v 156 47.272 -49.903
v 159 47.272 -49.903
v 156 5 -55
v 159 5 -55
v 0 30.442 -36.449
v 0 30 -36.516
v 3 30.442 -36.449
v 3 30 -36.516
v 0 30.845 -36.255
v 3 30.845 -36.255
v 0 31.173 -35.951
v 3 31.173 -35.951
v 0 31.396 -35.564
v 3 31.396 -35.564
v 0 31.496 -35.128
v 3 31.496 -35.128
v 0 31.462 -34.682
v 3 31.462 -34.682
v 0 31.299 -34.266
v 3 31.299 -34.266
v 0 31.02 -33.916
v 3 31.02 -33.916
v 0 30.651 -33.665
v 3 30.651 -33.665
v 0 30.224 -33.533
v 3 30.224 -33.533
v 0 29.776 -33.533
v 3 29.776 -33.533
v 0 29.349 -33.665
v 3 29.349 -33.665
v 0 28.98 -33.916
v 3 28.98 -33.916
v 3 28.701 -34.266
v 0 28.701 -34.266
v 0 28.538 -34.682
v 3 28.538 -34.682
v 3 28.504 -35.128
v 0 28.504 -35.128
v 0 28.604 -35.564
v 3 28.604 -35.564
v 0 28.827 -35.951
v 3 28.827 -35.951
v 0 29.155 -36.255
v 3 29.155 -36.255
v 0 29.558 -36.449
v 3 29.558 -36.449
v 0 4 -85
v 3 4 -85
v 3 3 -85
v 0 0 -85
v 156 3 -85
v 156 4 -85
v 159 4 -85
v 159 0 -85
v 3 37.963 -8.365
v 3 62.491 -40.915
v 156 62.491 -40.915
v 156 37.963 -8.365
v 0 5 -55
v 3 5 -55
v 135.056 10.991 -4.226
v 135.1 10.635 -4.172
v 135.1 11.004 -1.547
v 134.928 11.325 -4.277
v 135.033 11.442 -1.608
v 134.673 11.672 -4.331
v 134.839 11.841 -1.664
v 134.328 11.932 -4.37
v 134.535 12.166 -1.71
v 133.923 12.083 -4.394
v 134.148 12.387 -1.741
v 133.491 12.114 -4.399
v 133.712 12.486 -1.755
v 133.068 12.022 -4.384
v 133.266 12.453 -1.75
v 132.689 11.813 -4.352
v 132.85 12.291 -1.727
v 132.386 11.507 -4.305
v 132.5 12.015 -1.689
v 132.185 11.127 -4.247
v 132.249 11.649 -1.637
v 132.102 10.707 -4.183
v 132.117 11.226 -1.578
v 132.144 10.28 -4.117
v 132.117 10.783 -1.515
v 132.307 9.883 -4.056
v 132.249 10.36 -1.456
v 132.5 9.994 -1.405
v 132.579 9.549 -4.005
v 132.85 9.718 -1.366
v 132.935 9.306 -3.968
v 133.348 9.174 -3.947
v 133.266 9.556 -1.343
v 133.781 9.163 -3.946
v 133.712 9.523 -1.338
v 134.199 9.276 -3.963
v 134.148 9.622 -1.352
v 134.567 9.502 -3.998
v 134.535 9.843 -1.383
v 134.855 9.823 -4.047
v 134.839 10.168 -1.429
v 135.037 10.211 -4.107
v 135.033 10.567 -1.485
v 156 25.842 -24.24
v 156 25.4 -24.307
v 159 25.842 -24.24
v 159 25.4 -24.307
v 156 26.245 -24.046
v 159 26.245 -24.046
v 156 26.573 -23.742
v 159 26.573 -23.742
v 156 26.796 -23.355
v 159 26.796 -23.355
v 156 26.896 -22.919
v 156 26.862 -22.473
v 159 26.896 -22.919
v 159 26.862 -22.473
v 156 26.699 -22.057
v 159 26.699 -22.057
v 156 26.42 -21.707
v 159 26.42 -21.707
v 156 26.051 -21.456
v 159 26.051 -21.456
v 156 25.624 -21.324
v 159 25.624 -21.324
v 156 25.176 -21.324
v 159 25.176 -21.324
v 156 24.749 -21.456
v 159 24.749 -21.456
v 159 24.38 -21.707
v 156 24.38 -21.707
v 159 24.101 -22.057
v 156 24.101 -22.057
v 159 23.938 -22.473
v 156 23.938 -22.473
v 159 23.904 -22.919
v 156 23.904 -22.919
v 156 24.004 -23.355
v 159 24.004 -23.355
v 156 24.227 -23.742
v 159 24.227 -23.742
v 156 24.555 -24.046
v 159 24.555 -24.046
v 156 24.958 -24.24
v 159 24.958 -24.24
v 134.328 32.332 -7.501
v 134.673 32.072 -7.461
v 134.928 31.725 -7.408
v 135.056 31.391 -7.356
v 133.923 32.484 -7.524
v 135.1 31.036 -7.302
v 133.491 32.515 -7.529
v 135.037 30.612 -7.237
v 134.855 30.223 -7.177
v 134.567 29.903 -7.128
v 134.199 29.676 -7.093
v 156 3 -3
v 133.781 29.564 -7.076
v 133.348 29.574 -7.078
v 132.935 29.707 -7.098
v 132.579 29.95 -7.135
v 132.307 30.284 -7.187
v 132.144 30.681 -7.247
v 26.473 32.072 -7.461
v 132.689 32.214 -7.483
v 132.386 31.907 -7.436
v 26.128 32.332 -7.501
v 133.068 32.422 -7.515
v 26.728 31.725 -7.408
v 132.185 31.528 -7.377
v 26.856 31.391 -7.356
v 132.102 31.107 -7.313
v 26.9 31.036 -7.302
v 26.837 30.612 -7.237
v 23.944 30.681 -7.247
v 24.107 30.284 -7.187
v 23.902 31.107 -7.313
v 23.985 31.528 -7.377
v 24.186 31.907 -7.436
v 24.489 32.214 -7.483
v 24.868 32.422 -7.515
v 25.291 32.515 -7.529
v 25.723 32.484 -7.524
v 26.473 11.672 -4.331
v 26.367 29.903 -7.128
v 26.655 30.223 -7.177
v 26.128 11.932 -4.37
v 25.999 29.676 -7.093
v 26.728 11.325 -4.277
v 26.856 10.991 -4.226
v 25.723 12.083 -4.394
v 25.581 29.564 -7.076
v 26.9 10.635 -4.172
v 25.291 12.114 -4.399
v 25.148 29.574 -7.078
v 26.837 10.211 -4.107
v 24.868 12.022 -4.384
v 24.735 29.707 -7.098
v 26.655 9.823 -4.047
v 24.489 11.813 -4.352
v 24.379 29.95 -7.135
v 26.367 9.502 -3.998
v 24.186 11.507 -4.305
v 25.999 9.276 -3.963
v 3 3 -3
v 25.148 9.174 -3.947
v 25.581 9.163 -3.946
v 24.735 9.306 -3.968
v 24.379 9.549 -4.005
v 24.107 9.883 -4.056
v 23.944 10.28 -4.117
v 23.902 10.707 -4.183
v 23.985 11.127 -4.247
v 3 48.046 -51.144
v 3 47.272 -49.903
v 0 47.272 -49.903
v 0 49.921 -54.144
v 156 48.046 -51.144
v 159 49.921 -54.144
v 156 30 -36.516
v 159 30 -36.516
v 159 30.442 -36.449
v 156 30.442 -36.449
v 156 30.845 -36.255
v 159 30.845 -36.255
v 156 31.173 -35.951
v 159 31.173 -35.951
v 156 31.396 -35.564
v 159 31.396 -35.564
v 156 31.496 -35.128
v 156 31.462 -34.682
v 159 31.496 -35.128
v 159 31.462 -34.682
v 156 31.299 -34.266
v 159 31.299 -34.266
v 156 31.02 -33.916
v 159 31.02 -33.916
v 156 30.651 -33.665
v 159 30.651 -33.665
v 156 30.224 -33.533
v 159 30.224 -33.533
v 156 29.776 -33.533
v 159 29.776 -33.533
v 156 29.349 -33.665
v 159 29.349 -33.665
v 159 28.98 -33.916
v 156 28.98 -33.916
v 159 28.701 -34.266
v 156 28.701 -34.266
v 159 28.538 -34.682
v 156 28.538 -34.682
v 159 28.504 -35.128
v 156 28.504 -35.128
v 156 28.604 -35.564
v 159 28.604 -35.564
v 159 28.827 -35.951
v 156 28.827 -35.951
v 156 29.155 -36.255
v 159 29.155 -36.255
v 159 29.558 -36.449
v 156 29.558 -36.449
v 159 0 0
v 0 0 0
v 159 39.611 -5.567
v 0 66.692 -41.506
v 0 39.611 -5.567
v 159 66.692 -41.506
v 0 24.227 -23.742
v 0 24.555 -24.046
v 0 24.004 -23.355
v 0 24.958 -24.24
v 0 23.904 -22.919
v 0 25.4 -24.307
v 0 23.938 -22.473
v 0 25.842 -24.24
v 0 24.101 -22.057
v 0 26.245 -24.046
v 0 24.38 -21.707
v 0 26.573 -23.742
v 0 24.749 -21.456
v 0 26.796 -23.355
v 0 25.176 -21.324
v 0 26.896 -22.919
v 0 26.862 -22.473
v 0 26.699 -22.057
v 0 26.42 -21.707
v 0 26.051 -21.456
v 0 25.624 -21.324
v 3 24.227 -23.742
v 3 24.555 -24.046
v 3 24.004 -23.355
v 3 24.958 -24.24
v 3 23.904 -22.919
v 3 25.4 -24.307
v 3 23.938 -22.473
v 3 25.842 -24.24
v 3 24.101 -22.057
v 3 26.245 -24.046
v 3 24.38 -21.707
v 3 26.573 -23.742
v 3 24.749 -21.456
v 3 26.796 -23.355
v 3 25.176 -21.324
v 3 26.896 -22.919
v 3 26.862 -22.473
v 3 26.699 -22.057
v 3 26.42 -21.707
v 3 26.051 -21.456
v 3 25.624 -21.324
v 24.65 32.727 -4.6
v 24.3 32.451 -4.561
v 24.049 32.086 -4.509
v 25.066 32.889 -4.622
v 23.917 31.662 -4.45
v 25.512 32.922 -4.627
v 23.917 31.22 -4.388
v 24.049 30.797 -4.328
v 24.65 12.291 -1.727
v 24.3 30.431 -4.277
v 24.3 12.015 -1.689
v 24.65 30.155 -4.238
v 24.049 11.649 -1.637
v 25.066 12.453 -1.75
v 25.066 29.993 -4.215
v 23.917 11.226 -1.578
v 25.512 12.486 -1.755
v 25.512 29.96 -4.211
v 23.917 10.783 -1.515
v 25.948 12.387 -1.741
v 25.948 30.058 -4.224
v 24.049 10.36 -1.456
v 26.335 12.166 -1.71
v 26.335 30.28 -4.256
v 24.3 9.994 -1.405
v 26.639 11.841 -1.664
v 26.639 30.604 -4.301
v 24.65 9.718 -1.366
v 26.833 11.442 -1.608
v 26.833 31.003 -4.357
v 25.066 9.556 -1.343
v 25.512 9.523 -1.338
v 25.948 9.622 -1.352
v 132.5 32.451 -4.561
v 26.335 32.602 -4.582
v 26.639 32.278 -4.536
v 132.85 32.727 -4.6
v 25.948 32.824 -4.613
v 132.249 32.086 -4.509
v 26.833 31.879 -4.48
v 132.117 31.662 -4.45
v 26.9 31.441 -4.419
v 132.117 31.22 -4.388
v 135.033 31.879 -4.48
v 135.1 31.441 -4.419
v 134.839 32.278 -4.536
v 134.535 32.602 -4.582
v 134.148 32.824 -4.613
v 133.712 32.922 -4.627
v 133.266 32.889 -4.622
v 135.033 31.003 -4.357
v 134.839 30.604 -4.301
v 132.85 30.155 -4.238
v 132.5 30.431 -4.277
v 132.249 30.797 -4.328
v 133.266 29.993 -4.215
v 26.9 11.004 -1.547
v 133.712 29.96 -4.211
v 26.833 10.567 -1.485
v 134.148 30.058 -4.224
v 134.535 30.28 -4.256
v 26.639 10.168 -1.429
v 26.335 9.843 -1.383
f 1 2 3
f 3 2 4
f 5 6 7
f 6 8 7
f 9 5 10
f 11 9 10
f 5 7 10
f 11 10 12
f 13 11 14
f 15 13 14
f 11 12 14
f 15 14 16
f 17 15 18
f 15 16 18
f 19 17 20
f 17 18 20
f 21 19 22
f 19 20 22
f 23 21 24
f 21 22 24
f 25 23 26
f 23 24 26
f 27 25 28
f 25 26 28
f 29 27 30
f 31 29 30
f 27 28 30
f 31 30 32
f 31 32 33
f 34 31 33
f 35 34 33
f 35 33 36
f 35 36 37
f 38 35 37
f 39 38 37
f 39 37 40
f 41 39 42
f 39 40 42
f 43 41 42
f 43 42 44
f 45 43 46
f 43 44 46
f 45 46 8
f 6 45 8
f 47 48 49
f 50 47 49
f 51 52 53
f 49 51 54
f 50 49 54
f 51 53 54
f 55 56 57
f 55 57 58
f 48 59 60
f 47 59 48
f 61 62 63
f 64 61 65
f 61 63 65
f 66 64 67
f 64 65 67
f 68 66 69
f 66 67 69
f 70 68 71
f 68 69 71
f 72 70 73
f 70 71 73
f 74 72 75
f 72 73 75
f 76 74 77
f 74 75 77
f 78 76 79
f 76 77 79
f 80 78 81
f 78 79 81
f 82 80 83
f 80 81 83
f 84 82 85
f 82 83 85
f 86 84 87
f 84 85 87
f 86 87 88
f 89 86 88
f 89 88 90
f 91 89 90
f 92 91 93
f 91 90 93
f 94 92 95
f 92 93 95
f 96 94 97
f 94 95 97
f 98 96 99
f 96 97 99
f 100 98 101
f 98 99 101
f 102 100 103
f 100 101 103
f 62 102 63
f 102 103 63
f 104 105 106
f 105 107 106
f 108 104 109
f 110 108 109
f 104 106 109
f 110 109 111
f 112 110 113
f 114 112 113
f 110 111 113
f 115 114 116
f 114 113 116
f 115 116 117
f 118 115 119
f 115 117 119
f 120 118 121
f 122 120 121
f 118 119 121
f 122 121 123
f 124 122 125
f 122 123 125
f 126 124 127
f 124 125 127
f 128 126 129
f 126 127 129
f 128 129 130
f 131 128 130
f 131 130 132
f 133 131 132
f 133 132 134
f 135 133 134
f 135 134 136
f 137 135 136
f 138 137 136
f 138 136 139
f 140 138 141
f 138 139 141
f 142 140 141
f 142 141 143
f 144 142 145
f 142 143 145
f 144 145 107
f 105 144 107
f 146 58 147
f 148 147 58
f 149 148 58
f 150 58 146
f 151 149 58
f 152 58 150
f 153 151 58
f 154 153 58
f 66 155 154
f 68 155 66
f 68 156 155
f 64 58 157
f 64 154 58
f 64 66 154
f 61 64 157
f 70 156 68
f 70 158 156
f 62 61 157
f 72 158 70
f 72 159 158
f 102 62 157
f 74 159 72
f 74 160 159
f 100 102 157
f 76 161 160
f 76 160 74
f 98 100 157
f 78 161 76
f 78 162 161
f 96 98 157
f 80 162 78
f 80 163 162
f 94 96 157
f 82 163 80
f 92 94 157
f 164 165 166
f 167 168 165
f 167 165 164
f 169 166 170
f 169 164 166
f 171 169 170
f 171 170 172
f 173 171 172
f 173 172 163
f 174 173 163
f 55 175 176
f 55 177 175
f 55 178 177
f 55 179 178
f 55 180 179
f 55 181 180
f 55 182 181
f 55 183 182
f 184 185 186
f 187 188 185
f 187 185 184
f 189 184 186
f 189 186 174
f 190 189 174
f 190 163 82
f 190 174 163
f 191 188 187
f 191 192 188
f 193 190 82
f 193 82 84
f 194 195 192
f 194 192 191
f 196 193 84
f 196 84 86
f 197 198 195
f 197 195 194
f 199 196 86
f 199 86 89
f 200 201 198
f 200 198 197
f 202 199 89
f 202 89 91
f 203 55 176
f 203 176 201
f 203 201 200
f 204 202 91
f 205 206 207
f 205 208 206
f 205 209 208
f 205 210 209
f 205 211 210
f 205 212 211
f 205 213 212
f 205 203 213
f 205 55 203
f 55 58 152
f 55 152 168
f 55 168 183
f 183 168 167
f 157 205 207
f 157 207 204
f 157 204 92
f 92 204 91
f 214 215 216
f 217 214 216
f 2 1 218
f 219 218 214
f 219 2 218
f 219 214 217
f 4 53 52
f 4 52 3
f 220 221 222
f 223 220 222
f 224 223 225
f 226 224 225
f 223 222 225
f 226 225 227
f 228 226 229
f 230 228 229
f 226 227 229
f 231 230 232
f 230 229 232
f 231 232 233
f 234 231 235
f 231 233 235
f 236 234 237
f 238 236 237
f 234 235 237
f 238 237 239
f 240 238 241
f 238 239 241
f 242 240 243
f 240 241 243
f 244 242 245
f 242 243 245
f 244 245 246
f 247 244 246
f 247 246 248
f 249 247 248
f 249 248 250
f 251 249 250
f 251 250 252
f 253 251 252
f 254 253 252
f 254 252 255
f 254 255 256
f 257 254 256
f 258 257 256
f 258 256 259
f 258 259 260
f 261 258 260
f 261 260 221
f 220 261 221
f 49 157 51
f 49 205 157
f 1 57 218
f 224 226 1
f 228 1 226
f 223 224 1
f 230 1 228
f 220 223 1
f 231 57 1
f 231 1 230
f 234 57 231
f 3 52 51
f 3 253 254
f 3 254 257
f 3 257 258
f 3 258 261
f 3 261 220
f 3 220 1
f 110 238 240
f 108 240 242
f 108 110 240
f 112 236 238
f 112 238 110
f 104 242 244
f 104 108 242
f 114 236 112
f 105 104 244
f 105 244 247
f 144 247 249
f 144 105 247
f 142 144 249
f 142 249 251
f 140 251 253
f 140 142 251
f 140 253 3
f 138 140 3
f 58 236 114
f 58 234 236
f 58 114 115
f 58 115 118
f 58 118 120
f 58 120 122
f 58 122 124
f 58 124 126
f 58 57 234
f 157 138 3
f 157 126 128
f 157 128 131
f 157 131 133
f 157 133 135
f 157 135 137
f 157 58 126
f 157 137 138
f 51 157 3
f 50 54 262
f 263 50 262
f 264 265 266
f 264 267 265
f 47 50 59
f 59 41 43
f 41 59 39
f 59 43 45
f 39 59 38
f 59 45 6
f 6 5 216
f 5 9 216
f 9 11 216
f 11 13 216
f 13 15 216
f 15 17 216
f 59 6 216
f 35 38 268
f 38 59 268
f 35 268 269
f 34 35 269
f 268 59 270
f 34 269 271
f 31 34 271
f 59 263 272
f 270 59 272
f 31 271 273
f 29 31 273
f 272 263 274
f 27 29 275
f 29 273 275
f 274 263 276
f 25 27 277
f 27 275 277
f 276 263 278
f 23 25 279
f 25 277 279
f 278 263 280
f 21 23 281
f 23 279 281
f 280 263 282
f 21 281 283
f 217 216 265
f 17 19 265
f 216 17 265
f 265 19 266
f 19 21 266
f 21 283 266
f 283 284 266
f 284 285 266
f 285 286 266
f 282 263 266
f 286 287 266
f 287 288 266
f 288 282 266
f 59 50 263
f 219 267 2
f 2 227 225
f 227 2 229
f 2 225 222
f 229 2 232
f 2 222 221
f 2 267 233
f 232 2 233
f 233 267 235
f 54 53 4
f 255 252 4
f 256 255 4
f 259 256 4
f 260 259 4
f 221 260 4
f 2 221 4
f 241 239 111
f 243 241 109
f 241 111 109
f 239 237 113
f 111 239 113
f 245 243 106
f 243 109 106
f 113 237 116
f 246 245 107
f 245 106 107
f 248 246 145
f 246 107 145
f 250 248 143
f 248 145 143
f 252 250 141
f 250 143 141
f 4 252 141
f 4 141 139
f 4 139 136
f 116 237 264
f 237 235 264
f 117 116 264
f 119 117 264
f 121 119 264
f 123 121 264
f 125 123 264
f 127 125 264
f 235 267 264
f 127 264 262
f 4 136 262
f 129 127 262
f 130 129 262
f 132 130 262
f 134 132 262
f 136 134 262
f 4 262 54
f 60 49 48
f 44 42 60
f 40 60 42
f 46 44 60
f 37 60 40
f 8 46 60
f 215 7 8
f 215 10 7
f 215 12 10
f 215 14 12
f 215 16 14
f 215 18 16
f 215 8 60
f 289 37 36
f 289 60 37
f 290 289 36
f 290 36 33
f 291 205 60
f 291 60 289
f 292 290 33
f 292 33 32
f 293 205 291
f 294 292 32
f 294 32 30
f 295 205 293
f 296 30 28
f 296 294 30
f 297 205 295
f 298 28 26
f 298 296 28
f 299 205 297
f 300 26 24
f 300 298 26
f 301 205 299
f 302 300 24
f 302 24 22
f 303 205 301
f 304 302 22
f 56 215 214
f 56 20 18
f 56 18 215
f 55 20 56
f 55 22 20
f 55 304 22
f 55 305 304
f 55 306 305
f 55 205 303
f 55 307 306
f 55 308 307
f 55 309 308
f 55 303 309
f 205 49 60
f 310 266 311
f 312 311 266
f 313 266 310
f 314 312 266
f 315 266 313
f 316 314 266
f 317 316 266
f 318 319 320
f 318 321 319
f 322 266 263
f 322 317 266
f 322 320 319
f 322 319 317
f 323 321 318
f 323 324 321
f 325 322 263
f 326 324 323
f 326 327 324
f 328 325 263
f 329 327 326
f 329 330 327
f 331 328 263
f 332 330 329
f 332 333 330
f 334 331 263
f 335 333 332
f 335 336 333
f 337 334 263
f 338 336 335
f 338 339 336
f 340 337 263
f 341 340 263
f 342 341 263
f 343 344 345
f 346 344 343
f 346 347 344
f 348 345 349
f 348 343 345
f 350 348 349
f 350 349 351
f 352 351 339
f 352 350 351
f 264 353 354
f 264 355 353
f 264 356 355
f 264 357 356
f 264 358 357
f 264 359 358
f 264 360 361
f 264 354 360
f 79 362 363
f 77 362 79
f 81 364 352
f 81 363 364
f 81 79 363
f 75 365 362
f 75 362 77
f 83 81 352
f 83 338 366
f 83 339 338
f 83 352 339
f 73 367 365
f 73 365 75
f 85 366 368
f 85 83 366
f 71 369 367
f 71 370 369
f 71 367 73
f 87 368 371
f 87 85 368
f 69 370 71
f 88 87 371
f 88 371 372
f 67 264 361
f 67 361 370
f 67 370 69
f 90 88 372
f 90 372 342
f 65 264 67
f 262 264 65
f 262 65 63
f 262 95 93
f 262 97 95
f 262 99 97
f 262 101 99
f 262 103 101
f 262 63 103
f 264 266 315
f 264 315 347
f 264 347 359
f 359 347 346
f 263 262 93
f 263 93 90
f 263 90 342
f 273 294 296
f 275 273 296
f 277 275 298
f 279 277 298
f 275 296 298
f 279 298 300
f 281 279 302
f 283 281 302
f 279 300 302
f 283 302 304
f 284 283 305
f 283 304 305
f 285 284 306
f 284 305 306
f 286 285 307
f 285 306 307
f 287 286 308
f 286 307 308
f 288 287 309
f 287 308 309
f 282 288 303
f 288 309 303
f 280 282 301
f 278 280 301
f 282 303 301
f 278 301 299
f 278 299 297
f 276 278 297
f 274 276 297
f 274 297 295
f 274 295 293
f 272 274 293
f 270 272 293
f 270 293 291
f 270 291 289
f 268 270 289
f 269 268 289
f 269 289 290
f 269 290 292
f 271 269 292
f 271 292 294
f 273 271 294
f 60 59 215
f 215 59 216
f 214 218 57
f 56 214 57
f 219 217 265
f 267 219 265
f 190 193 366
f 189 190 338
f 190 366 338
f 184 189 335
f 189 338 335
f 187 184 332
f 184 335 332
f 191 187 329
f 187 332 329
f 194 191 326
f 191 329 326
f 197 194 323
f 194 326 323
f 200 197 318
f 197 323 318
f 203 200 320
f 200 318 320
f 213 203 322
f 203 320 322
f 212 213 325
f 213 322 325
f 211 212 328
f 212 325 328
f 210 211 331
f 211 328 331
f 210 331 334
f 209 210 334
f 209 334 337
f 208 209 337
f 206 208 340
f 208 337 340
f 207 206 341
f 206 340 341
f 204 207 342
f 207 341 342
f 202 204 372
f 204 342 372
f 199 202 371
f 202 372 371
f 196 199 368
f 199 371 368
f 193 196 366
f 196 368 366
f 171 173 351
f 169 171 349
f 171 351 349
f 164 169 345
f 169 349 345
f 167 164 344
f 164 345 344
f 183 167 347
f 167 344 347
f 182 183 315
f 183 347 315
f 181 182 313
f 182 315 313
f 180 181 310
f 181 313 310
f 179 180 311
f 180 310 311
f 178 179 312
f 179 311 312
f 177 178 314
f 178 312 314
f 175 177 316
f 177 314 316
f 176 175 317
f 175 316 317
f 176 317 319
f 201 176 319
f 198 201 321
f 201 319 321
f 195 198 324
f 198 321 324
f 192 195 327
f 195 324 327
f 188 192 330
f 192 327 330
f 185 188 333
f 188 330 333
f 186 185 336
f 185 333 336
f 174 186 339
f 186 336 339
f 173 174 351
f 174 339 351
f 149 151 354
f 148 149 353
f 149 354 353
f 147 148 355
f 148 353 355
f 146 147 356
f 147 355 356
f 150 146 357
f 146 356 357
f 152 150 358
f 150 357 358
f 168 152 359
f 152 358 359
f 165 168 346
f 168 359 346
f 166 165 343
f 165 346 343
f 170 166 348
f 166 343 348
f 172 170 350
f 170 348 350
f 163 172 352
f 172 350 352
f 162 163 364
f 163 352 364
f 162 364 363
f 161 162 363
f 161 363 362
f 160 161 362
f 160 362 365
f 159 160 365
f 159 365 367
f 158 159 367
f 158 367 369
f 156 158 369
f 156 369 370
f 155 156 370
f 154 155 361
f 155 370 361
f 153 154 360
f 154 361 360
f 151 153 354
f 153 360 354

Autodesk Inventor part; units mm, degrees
ref_plane "YZ Plane" through (0, 0, 0) normal (1, 0, 0) x (0, 1, 0)
ref_plane "XZ Plane" through (0, 0, 0) normal (0, 1, 0) x (-1, 0, 0)
sketch "Sketch1" plane through (0, 0, 0) normal (1, 0, 0) x (0, 1, 0)
  line L0 (0, 0) -> (0, -85)
  line L1 (0, 0) -> (39.6107, -5.5669)
  line L2 (0, 0) -> (40, 0) construction
  line L3 (39.6107, -5.5669) -> (66.6924, -41.5055)
  line L4 (66.6924, -41.5055) -> (49.9211, -54.1436)
  line L5 (49.9211, -54.1436) -> (47.2715, -49.9034)
  line L6 (0, -85) -> (4, -85)
  line L7 (5, -55) -> (4, -85)
  line L8 (5, -55) -> (47.2715, -49.9034)
  dimension "d0" = 85
  dimension "d1" = 40
  dimension "d2" = 8
  dimension "d3" = 45
  dimension "d4" = 135
  dimension "d5" = 21
  dimension "d6" = 5
  dimension "d7" = 85
  dimension "d12" = 4
  dimension "d13" = 5
  dimension "d50" = 30
extrude "Extrusion1" add sketch "Sketch1" along normal blind 3
sketch "Sketch2" plane through (3, 0, 0) normal (1, 0, 0) x (0, 0, -1)
  line L0 (0, 0) -> (85, 0) projected
  line L1 (85, 0) -> (85, 4) projected
  line L2 (85, 4) -> (55, 5) projected
  line L3 (49.9034, 47.2715) -> (54.1436, 49.9211) projected
  line L4 (54.1436, 49.9211) -> (41.5055, 66.6924) projected
  line L5 (41.5055, 66.6924) -> (5.5669, 39.6107) projected
  line L6 (5.5669, 39.6107) -> (0, 0) projected
  line L7 (49.9034, 47.2715) -> (54.1436, 49.9211) projected
  line L8 (51.1436, 48.0464) -> (40.9151, 62.491)
  line L9 (41.5055, 66.6924) -> (5.5669, 39.6107) projected
  line L10 (54.1436, 49.9211) -> (41.5055, 66.6924) projected
  line L11 (40.9151, 62.491) -> (8.3648, 37.9627)
  line L12 (8.3648, 37.9627) -> (3, 3)
  line L13 (5.5669, 39.6107) -> (0, 0) projected
  line L14 (3, 3) -> (85, 3)
  line L15 (85, 0) -> (85, 4) projected
  line L16 (85, 3) -> (85, 0)
  line L17 (0, 0) -> (85, 0) projected
  line L18 (85, 0) -> (0, 0)
  line L19 (0, 0) -> (5.5669, 39.6107)
  line L20 (5.5669, 39.6107) -> (41.5055, 66.6924)
  line L21 (41.5055, 66.6924) -> (54.1436, 49.9211)
  line L22 (54.1436, 49.9211) -> (51.1436, 48.0464)
  line L23 (55, 5) -> (49.9034, 47.2715) projected
  dimension "d14" = 3
  dimension "d15" = 3
  dimension "d16" = 3
  dimension "d17" = 3
  dimension "d18" = 3
  dimension "d21" = 3
  dimension "d22" = 3
  dimension "d23" = 3
extrude "Extrusion2" add sketch "Sketch2" along normal blind 153 contours L6 L5 L4 L3 L8 L11 L12 L14 L1 L0
ref_plane "Work Plane1" through (79.5, 0, 0) normal (1, 0, 0) x (0, 0, -1)
mirror "Mirror1" about plane through (79.5, 0, 0) normal (1, 0, 0) of "Extrusion1"
sketch "Sketch3" plane through (159, 0, -85) normal (1, 0, 0) x (0, 0, -1)
  line L0 (-85, 0) -> (0, 0) projected
  line L1 (-79.4331, 39.6107) -> (-85, 0) projected
  circle A0 centre (-62.193, 25.4) radius 1.5
  circle A1 centre (-49.984, 30) radius 1.5
  dimension "d28" = 25.4
  dimension "d29" = 30
  dimension "d31" = 19.05
  dimension "d32" = 30.5
  dimension "d33" = 3
  dimension "d34" = 3
extrude "Extrusion3" cut sketch "Sketch3" against normal blind 200
sketch "Sketch4" plane through (0, 0, 0) normal (0, 0.1392, 0.9903) x (1, 0, 0)
  line L0 (0, 0) -> (159, 0) projected
  line L1 (0, 40) -> (0, 0) projected
  line L2 (159, 40) -> (159, 0) projected
  circle A0 centre (25.4, 31.75) radius 1.5
  circle A1 centre (25.4, 11.1125) radius 1.5
  circle A2 centre (133.6, 31.75) radius 1.5
  circle A3 centre (133.6, 11.1125) radius 1.5
  dimension "d37" = 11.1125
  dimension "d38" = 31.75
  dimension "d39" = 25.4
  dimension "d40" = 31.75
  dimension "d41" = 11.1125
  dimension "d42" = 25.4
  dimension "d43" = 3
  dimension "d44" = 3
  dimension "d45" = 3
  dimension "d46" = 3
extrude "Extrusion4" cut sketch "Sketch4" against normal blind 10
equation "\"d40\" = d38"
equation "\"d41\" = d37"
equation "\"d42\" = d39"
properties part number "plowV4"
